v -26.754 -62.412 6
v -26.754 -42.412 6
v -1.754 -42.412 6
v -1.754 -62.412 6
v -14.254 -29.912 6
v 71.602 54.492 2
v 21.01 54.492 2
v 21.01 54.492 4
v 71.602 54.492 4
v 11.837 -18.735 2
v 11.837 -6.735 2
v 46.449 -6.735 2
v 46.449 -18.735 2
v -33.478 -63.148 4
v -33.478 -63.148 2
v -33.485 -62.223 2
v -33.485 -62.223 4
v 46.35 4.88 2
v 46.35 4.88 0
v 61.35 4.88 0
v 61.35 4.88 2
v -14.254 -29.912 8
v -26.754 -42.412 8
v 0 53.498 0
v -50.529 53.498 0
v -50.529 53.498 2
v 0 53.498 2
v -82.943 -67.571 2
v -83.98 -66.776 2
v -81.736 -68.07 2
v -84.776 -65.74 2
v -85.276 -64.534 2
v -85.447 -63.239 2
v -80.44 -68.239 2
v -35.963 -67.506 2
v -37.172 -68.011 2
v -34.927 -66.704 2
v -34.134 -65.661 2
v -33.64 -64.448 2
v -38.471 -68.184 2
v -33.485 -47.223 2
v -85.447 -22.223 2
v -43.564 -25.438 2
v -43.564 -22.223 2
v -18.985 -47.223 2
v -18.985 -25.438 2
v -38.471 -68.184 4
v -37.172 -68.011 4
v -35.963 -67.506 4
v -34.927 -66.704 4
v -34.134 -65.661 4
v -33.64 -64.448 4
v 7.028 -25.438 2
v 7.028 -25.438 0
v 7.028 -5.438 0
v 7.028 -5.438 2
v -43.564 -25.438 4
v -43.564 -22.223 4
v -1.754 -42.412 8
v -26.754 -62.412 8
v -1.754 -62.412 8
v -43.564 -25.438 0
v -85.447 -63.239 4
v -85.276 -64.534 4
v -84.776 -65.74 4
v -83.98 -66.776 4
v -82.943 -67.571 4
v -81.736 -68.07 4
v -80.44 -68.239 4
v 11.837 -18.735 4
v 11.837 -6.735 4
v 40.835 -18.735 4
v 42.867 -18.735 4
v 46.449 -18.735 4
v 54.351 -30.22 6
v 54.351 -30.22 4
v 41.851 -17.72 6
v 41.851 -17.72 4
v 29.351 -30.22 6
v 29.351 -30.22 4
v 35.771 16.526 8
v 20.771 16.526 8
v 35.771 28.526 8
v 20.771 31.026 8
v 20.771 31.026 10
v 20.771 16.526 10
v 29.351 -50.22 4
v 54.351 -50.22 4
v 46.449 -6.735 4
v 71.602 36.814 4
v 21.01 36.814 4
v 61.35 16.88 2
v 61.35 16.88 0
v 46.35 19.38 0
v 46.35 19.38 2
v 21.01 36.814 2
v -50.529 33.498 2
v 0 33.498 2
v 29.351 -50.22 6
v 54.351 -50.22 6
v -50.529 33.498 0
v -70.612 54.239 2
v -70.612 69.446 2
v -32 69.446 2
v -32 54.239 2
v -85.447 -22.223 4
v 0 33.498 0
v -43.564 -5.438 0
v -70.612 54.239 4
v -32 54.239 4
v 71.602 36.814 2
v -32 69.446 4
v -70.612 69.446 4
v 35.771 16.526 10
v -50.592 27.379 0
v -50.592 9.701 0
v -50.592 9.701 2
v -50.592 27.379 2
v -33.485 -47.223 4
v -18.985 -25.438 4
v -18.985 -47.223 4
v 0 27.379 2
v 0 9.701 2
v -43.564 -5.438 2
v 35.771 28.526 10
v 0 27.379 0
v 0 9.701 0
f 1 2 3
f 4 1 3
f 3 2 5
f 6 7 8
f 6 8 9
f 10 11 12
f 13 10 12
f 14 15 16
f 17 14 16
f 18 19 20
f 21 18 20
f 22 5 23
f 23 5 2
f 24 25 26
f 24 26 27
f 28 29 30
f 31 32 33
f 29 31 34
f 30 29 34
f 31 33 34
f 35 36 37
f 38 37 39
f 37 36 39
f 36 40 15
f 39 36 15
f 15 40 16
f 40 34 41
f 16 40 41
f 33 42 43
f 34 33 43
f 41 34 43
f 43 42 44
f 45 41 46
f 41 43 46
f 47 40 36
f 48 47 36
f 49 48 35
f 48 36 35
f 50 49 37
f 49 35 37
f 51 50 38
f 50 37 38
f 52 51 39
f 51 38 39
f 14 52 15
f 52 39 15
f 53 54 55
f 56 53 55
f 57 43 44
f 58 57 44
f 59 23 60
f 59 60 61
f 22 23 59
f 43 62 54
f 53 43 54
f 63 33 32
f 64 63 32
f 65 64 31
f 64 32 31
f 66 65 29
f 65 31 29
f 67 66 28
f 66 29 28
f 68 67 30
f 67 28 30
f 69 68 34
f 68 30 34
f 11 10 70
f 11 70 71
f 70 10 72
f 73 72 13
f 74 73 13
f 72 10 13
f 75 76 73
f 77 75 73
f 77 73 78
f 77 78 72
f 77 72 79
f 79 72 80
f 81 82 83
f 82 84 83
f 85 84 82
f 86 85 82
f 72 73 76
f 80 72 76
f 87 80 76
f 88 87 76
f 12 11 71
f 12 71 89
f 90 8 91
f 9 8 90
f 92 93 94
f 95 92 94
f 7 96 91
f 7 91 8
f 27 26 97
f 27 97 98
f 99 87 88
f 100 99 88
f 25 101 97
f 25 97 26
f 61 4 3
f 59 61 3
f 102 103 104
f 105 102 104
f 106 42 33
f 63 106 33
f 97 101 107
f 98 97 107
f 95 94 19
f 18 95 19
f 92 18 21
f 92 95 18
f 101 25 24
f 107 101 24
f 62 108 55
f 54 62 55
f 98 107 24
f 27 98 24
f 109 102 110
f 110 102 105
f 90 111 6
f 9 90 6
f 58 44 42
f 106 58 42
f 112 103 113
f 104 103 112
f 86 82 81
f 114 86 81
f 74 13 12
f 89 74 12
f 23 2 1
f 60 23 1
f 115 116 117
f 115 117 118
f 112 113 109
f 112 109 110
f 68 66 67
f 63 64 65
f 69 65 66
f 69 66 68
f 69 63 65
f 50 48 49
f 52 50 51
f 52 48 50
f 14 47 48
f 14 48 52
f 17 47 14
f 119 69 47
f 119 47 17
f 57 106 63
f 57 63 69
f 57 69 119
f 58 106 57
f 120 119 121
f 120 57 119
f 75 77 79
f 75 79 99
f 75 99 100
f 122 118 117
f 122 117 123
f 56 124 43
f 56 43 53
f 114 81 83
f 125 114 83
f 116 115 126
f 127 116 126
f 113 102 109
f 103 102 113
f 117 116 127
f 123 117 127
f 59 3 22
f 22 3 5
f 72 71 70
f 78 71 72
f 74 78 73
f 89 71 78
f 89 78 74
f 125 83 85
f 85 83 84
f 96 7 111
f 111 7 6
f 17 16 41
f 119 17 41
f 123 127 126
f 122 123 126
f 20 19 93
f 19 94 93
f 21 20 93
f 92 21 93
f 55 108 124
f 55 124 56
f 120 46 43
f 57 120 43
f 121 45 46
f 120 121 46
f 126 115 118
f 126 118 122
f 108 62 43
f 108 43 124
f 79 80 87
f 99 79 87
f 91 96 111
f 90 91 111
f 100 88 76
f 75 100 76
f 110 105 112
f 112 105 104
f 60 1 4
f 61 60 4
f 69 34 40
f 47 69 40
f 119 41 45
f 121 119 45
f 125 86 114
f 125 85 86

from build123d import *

# Parameters (mm, degrees)
F0_W      = 50.592
F0_H      = 20
F1_DEPTH  = 2
F2_W      = 50.529
F2_H      = 20
F3_DEPTH  = 2
F4_W      = 50.592
F4_H      = 17.678
F5_DEPTH  = 2
F6_W      = 50.592
F6_H      = 17.678
F7_DEPTH  = 2
F9_DEPTH  = 2
F11_DEPTH = 2
F13_DEPTH = 2
F15_DEPTH = 2
F16_W     = 38.612
F16_H     = 15.207
F17_DEPTH = 2
F19_DEPTH = 2
F20_W     = 34.612
F20_H     = 12
F21_DEPTH = 2


with BuildPart() as f1:
    # F0 (on Top) → F1 (new body)
    with BuildSketch(Plane.XY):
        with Locations((-18.267832, -15.437623)):
            Rectangle(F0_W, F0_H)
    extrude(amount=F1_DEPTH)


with BuildPart() as f3:
    # F2 (on Top) → F3 (new body)
    with BuildSketch(Plane.XY):
        with Locations((-25.2645, 43.497933)):
            Rectangle(F2_W, F2_H)
    extrude(amount=F3_DEPTH)


with BuildPart() as f5:
    # F4 (on Top) → F5 (new body)
    with BuildSketch(Plane.XY):
        with Locations((-25.296, 18.540088)):
            Rectangle(F4_W, F4_H)
    extrude(amount=F5_DEPTH)


with BuildPart() as f7:
    # F6 (on face) → F7 (new body)
    with BuildSketch(Plane.XY.offset(2)):
        with Locations((46.305613, 45.653364)):
            Rectangle(F6_W, F6_H)
    extrude(amount=F7_DEPTH)


with BuildPart() as f9:
    # F8 (on face) → F9 (new body)
    with BuildSketch(Plane.XY.offset(4)):
        Polygon((41.851087, -17.719843), (29.351087, -30.219843), (29.351087, -50.219843), (33.131574, -50.219843), (50.5706, -50.219843), (54.351087, -50.219843), (54.351087, -30.219843), align=None)
    extrude(amount=F9_DEPTH)

    # F20 (on face) → F21 (join)
    with BuildSketch(Plane.XY.offset(2)):
        with Locations((29.142566, -12.735494)):
            Rectangle(F20_W, F20_H)
    extrude(amount=F21_DEPTH)


with BuildPart() as f11:
    # F10 (on face) → F11 (new body)
    with BuildSketch(Plane.XY.offset(6)):
        Polygon((-14.253861, -29.911844), (-26.753861, -42.411844), (-26.753861, -62.411844), (-1.753861, -62.411844), (-1.753861, -42.411844), align=None)
    extrude(amount=F11_DEPTH)


with BuildPart() as f13:
    # F12 (on face) → F13 (new body)
    with BuildSketch(Plane.XY.offset(8)):
        Polygon((20.770659, 28.525631), (20.770659, 16.525631), (35.770659, 16.525631), (35.770659, 28.525631), (20.770659, 31.025631), align=None)
    extrude(amount=F13_DEPTH)


with BuildPart() as f15:
    # F14 (on Top) → F15 (new body)
    with BuildSketch(Plane.XY):
        Polygon((46.350436, 16.879594), (46.350436, 4.879594), (61.350436, 4.879594), (61.350436, 16.879594), (46.350436, 19.379594), align=None)
    extrude(amount=F15_DEPTH)


with BuildPart() as f17:
    # F16 (on face) → F17 (new body)
    with BuildSketch(Plane.XY.offset(2)):
        with Locations((-51.305815, 61.842361)):
            Rectangle(F16_W, F16_H)
    extrude(amount=F17_DEPTH)


with BuildPart() as f19:
    # F18 (on face) → F19 (new body)
    with BuildSketch(Plane.XY.offset(2)):
        with BuildLine():
            Line((-33.477804, -63.147744), (-33.484528, -62.223211))
            Line((-33.484528, -62.223211), (-33.484528, -47.223211))
            Line((-33.484528, -47.223211), (-18.98453, -47.223211))
            Line((-18.98453, -47.223211), (-18.98453, -25.437623))
            Line((-18.98453, -25.437623), (-43.563832, -25.437623))
            Line((-43.563832, -25.437623), (-43.563832, -22.223211))
            Line((-43.563832, -22.223211), (-85.446797, -22.223211))
            Line((-85.446797, -22.223211), (-85.446797, -47.223211))
            Line((-85.446797, -47.223211), (-85.446797, -63.238602))
            ThreePointArc((-85.446797, -63.238602), (-83.980035, -66.77643), (-80.440306, -68.238598))
            Line((-80.440306, -68.238598), (-38.47118, -68.184107))
            ThreePointArc((-38.47118, -68.184107), (-34.927017, -66.70446), (-33.477804, -63.147744))
        make_face()
    extrude(amount=F19_DEPTH)


solid = Compound([f1.part, f3.part, f5.part, f7.part, f9.part, f11.part, f13.part, f15.part, f17.part, f19.part])
